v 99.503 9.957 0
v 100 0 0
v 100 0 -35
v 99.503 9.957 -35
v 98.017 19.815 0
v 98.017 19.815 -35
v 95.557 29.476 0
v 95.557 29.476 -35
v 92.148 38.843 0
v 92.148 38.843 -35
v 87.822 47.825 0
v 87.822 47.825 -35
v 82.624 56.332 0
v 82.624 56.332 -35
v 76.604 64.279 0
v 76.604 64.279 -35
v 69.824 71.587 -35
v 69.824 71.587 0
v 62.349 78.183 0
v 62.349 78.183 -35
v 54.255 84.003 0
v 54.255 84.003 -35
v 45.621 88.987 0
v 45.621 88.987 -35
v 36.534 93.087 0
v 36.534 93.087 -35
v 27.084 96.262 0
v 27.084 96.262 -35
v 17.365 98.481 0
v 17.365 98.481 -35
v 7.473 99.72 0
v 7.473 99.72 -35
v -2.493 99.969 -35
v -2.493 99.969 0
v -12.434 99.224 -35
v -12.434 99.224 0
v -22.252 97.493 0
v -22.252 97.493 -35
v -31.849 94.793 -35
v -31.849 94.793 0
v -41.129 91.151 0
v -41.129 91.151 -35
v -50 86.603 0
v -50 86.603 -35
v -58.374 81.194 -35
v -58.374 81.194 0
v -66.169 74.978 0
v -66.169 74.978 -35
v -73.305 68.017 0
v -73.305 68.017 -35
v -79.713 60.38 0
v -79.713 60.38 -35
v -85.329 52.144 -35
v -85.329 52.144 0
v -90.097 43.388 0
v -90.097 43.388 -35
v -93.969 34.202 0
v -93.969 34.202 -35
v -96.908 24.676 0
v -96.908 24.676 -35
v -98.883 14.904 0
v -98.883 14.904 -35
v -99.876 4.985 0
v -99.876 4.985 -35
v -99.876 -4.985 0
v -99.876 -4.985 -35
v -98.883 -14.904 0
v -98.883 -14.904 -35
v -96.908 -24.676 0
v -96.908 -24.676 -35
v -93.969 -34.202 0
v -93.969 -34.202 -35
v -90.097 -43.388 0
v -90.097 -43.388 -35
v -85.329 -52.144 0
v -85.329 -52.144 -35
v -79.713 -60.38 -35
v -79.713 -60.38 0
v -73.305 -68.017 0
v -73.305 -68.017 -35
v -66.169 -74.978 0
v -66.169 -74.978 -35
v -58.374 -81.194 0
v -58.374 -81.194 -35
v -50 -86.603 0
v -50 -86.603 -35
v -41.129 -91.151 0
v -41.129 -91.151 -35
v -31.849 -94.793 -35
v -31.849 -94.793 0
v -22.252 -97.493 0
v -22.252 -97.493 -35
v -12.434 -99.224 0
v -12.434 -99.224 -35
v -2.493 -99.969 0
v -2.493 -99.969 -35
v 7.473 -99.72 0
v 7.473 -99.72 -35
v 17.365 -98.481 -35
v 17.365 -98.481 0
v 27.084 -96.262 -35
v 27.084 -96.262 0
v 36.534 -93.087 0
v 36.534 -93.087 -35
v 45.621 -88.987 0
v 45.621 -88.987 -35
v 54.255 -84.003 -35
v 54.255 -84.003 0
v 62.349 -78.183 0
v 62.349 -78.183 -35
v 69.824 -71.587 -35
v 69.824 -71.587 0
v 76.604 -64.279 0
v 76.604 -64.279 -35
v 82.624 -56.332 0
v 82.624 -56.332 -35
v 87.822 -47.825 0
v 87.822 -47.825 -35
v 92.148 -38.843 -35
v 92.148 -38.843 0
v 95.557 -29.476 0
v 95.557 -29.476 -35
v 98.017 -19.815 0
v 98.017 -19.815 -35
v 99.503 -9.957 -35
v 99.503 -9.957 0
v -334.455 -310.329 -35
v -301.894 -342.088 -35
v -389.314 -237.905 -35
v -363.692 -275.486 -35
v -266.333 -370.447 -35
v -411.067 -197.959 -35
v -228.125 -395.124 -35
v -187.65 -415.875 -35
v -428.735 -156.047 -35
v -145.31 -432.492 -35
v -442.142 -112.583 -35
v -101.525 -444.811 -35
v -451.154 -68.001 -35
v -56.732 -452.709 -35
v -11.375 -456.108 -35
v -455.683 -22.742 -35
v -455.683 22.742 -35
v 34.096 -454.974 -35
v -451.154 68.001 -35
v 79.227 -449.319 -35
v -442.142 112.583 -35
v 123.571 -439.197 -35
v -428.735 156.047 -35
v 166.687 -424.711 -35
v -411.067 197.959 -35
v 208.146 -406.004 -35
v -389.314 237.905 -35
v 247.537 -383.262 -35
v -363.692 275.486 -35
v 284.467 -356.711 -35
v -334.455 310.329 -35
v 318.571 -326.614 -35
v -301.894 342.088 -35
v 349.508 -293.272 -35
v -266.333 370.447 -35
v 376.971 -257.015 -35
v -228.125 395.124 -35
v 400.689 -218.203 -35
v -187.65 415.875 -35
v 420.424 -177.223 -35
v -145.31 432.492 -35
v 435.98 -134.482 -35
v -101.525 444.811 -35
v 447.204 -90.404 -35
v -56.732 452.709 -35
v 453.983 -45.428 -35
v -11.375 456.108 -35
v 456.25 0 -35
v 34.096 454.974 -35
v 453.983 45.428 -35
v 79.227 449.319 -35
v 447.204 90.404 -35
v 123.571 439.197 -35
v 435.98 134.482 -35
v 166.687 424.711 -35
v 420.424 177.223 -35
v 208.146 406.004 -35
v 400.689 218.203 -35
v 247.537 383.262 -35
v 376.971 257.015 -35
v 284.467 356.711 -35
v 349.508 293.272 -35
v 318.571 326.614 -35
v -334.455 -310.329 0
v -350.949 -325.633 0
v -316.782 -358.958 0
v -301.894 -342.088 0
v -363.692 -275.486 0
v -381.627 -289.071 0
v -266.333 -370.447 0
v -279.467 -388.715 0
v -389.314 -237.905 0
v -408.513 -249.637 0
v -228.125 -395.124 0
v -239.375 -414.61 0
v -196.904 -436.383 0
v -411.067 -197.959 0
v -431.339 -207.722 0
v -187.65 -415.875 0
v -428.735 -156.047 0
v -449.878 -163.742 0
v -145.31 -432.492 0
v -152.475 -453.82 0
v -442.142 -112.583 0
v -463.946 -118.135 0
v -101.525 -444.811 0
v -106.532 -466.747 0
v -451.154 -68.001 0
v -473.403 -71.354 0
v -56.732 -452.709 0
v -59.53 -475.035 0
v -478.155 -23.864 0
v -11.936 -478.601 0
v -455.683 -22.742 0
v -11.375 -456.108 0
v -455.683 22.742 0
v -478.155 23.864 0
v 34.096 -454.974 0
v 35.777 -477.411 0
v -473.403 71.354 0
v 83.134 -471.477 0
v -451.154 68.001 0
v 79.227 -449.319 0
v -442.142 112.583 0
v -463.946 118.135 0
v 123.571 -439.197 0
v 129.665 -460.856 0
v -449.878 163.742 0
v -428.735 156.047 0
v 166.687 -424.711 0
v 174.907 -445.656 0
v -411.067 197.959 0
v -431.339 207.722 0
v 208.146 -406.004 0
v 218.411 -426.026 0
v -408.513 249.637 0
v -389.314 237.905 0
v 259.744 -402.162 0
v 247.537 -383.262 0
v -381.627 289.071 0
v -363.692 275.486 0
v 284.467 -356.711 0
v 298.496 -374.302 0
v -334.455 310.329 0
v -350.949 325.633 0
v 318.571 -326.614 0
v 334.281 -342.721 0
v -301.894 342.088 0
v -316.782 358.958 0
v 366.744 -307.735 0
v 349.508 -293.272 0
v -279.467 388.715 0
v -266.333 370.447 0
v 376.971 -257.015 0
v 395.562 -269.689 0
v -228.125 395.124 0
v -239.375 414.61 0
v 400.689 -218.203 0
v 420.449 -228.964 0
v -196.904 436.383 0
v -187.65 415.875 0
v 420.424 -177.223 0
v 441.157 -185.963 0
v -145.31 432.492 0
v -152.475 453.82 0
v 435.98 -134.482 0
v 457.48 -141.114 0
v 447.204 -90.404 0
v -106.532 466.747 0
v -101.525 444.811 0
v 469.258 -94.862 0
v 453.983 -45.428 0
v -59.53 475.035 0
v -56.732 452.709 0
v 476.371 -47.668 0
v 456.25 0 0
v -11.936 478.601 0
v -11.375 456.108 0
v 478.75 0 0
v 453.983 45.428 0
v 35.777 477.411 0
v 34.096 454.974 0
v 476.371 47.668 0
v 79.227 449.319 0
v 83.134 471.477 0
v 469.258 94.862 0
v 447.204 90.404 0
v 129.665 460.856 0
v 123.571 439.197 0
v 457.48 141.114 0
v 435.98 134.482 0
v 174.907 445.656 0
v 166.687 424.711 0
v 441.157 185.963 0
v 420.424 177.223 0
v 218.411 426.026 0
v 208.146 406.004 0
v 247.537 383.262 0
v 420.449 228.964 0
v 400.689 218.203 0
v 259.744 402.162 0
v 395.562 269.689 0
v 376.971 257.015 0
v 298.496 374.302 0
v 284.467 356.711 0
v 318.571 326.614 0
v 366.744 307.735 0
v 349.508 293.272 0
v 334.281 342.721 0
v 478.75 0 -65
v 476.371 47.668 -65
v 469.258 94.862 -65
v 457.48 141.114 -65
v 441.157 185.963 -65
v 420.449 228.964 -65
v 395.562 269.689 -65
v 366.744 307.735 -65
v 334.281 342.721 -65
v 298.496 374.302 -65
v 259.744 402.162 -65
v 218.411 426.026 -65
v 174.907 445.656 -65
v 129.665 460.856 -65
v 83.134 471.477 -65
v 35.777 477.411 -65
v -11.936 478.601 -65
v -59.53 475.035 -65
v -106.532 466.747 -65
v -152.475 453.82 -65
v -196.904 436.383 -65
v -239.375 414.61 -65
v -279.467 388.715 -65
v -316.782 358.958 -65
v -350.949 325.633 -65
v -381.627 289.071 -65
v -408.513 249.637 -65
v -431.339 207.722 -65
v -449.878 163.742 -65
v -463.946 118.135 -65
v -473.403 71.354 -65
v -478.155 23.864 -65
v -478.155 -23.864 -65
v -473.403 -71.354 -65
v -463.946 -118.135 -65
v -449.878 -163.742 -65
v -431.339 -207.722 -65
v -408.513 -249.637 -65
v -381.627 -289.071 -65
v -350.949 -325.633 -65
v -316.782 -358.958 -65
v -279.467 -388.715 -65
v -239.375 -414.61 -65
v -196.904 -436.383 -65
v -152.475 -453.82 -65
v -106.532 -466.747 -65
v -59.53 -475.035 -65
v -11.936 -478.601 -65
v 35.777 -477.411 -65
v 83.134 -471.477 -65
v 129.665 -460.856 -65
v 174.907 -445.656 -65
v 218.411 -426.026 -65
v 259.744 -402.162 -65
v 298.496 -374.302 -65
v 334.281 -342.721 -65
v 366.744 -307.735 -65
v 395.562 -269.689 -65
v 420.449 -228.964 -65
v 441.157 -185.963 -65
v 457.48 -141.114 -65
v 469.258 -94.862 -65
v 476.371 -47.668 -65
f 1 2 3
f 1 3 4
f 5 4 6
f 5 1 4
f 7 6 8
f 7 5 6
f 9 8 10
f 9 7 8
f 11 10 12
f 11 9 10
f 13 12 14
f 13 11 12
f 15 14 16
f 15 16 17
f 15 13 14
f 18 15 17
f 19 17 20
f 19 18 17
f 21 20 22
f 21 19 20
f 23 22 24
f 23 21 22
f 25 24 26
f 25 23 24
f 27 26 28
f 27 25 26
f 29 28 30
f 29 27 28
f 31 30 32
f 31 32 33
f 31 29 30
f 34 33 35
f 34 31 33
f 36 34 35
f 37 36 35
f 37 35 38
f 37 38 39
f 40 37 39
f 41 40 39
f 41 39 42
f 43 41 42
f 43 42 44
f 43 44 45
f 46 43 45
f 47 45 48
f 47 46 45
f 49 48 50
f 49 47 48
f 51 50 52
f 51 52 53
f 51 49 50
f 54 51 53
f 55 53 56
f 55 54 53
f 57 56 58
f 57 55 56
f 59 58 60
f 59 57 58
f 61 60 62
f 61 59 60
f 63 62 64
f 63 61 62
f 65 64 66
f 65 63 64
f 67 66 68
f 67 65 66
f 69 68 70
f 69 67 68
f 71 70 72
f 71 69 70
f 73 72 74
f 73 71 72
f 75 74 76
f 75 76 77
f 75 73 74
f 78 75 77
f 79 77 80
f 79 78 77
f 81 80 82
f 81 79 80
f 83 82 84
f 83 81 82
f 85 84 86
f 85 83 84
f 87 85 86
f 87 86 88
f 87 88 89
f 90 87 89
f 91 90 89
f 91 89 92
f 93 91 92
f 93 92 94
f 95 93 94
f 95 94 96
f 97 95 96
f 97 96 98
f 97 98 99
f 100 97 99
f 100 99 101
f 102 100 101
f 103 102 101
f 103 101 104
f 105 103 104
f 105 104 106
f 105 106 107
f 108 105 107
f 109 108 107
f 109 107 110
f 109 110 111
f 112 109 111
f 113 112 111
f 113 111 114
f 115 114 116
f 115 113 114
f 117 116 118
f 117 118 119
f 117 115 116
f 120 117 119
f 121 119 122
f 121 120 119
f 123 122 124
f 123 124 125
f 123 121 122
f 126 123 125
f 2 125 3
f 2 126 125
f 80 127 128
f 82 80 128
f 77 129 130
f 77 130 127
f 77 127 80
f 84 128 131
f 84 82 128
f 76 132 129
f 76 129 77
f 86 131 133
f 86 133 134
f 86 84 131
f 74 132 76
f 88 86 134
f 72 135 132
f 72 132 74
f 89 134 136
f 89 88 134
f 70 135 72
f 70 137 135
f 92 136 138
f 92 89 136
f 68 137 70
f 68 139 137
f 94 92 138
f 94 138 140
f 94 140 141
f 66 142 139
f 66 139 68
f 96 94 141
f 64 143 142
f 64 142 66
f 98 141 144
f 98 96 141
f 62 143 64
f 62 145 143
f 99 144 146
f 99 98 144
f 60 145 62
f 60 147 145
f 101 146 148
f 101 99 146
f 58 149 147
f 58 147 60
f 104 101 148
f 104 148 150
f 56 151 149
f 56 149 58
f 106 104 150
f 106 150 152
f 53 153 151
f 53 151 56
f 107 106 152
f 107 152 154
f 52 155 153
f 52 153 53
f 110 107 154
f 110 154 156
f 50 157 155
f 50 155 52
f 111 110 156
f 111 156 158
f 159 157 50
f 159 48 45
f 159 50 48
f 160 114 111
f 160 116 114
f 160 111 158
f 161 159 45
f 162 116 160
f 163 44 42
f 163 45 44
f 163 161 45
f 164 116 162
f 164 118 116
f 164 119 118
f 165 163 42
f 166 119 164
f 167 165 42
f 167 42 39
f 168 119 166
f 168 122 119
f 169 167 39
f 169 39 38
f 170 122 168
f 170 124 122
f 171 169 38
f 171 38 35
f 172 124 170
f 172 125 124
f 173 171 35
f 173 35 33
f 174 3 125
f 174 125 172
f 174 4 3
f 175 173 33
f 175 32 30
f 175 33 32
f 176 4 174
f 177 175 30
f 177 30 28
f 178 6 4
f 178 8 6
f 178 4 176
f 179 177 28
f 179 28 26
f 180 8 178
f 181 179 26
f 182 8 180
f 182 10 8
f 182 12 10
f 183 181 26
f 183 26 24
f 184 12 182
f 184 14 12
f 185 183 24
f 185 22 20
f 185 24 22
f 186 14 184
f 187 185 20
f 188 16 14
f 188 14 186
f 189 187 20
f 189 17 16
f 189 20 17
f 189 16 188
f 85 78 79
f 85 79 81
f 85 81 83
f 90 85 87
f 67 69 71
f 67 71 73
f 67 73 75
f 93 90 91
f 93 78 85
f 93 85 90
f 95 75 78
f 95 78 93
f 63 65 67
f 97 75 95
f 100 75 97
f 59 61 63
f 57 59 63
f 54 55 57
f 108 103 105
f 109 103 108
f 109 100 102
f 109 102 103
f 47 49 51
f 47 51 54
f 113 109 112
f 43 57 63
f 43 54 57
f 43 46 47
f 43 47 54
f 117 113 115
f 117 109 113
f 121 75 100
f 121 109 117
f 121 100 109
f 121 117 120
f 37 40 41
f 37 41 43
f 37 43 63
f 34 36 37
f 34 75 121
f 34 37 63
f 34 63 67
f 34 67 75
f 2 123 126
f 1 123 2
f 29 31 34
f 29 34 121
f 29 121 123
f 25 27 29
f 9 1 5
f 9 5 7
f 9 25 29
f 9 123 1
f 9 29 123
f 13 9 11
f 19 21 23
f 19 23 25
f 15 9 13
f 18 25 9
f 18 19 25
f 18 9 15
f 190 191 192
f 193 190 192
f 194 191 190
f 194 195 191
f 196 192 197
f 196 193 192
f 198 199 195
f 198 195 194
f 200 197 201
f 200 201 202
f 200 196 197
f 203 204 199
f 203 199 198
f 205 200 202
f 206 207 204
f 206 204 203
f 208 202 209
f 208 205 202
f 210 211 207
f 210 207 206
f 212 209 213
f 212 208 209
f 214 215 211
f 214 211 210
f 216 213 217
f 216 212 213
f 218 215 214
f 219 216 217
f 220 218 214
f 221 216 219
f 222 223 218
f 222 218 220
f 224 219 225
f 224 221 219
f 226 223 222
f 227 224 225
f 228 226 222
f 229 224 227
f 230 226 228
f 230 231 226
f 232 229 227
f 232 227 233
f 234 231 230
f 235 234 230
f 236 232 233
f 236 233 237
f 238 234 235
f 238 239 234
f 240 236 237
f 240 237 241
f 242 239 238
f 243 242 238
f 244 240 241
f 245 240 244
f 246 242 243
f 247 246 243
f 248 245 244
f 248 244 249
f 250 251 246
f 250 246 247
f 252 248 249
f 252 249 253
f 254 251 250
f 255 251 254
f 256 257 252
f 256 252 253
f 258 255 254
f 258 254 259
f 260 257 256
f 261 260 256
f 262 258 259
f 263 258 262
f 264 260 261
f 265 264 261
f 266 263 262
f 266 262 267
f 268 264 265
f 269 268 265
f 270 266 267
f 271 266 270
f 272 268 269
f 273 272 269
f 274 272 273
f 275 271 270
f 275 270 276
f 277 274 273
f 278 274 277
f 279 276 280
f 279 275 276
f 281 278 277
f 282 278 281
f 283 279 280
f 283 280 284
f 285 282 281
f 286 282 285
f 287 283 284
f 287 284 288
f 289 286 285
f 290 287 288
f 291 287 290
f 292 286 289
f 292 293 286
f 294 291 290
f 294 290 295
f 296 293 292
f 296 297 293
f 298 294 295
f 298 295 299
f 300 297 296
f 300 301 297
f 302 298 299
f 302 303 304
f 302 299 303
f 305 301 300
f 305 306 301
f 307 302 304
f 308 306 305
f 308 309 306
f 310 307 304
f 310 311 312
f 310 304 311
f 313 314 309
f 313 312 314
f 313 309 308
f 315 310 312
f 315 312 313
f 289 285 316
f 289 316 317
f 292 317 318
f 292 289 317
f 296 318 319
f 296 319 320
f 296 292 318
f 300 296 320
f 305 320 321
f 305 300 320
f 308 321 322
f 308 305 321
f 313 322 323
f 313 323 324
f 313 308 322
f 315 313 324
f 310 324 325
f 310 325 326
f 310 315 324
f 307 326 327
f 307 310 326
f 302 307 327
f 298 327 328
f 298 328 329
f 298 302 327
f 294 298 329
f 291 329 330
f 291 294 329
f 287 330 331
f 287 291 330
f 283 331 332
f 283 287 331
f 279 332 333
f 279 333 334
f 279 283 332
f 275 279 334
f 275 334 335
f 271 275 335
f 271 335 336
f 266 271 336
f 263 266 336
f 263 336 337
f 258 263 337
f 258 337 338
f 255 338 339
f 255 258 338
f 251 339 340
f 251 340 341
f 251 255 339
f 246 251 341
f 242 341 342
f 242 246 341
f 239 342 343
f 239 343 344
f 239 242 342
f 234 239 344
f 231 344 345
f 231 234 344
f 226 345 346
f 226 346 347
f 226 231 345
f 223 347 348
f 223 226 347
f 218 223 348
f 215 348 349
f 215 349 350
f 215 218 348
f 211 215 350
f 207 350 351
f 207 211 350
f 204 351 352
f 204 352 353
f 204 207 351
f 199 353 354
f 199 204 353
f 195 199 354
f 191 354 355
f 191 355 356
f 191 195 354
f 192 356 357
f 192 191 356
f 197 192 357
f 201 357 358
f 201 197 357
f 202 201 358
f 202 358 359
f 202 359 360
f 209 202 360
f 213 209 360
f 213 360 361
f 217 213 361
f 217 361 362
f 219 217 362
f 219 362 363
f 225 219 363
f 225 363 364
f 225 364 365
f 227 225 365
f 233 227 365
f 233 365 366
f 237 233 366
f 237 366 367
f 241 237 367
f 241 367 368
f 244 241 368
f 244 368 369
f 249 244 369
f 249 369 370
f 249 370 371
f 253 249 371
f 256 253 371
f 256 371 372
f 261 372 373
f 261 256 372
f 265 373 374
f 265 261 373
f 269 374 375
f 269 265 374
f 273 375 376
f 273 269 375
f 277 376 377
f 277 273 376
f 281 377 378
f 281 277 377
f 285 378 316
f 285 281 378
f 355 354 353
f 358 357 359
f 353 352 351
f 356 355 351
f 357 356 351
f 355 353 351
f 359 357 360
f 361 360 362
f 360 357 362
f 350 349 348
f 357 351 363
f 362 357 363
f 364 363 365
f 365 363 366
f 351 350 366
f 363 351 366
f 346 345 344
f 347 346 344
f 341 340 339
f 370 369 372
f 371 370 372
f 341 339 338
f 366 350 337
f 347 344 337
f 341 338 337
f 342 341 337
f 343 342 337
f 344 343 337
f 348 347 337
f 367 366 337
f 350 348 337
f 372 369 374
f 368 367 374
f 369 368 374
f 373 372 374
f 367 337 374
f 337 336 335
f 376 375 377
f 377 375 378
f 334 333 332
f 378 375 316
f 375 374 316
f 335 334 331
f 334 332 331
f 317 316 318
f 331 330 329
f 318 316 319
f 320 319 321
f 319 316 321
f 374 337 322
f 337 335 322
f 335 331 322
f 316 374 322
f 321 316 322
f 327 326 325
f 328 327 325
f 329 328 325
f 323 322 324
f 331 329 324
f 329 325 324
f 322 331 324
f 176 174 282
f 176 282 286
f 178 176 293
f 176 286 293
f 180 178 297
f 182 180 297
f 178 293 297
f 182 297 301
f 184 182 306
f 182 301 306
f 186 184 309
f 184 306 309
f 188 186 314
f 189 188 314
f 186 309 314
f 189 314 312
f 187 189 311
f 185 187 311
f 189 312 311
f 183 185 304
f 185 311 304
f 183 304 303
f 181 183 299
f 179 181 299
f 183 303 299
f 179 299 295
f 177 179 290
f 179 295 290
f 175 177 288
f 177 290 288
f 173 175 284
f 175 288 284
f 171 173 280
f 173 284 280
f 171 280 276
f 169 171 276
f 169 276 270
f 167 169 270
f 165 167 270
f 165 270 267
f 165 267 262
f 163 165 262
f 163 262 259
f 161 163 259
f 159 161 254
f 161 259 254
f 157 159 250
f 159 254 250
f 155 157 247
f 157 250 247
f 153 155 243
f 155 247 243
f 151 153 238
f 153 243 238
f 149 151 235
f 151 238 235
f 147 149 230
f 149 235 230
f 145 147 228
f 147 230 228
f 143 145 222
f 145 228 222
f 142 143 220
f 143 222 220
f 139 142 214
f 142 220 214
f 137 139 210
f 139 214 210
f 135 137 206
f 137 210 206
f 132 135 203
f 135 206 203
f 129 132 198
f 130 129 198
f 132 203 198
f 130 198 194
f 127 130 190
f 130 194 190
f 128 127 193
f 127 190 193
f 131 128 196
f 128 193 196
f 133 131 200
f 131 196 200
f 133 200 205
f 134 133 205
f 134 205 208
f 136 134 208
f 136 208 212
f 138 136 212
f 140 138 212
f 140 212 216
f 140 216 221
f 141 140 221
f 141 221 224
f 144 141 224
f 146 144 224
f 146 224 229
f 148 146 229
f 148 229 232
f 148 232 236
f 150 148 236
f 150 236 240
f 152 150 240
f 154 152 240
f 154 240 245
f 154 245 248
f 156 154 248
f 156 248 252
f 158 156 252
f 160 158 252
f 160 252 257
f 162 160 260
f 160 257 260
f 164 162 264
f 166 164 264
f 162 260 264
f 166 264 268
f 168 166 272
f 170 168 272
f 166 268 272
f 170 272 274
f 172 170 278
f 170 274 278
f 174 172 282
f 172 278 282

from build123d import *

# Parameters (mm, degrees)
SKETCH1_R           = 478.75
BOSS_EXTRUDE1_DEPTH = 65
SKETCH2_R           = 456.25
SKETCH2_R_2         = 100
CUT_EXTRUDE1_DEPTH  = 35


with BuildPart() as part:
    # Sketch1 → Boss-Extrude1 (new body)
    with BuildSketch(Plane.XY):
        Circle(SKETCH1_R)
    extrude(amount=-BOSS_EXTRUDE1_DEPTH)

    # Sketch2 → Cut-Extrude1 (cut)
    with BuildSketch(Plane.XY):
        Circle(SKETCH2_R)
        Circle(SKETCH2_R_2, mode=Mode.SUBTRACT)
    extrude(amount=-CUT_EXTRUDE1_DEPTH, mode=Mode.SUBTRACT)


solid = part.part
